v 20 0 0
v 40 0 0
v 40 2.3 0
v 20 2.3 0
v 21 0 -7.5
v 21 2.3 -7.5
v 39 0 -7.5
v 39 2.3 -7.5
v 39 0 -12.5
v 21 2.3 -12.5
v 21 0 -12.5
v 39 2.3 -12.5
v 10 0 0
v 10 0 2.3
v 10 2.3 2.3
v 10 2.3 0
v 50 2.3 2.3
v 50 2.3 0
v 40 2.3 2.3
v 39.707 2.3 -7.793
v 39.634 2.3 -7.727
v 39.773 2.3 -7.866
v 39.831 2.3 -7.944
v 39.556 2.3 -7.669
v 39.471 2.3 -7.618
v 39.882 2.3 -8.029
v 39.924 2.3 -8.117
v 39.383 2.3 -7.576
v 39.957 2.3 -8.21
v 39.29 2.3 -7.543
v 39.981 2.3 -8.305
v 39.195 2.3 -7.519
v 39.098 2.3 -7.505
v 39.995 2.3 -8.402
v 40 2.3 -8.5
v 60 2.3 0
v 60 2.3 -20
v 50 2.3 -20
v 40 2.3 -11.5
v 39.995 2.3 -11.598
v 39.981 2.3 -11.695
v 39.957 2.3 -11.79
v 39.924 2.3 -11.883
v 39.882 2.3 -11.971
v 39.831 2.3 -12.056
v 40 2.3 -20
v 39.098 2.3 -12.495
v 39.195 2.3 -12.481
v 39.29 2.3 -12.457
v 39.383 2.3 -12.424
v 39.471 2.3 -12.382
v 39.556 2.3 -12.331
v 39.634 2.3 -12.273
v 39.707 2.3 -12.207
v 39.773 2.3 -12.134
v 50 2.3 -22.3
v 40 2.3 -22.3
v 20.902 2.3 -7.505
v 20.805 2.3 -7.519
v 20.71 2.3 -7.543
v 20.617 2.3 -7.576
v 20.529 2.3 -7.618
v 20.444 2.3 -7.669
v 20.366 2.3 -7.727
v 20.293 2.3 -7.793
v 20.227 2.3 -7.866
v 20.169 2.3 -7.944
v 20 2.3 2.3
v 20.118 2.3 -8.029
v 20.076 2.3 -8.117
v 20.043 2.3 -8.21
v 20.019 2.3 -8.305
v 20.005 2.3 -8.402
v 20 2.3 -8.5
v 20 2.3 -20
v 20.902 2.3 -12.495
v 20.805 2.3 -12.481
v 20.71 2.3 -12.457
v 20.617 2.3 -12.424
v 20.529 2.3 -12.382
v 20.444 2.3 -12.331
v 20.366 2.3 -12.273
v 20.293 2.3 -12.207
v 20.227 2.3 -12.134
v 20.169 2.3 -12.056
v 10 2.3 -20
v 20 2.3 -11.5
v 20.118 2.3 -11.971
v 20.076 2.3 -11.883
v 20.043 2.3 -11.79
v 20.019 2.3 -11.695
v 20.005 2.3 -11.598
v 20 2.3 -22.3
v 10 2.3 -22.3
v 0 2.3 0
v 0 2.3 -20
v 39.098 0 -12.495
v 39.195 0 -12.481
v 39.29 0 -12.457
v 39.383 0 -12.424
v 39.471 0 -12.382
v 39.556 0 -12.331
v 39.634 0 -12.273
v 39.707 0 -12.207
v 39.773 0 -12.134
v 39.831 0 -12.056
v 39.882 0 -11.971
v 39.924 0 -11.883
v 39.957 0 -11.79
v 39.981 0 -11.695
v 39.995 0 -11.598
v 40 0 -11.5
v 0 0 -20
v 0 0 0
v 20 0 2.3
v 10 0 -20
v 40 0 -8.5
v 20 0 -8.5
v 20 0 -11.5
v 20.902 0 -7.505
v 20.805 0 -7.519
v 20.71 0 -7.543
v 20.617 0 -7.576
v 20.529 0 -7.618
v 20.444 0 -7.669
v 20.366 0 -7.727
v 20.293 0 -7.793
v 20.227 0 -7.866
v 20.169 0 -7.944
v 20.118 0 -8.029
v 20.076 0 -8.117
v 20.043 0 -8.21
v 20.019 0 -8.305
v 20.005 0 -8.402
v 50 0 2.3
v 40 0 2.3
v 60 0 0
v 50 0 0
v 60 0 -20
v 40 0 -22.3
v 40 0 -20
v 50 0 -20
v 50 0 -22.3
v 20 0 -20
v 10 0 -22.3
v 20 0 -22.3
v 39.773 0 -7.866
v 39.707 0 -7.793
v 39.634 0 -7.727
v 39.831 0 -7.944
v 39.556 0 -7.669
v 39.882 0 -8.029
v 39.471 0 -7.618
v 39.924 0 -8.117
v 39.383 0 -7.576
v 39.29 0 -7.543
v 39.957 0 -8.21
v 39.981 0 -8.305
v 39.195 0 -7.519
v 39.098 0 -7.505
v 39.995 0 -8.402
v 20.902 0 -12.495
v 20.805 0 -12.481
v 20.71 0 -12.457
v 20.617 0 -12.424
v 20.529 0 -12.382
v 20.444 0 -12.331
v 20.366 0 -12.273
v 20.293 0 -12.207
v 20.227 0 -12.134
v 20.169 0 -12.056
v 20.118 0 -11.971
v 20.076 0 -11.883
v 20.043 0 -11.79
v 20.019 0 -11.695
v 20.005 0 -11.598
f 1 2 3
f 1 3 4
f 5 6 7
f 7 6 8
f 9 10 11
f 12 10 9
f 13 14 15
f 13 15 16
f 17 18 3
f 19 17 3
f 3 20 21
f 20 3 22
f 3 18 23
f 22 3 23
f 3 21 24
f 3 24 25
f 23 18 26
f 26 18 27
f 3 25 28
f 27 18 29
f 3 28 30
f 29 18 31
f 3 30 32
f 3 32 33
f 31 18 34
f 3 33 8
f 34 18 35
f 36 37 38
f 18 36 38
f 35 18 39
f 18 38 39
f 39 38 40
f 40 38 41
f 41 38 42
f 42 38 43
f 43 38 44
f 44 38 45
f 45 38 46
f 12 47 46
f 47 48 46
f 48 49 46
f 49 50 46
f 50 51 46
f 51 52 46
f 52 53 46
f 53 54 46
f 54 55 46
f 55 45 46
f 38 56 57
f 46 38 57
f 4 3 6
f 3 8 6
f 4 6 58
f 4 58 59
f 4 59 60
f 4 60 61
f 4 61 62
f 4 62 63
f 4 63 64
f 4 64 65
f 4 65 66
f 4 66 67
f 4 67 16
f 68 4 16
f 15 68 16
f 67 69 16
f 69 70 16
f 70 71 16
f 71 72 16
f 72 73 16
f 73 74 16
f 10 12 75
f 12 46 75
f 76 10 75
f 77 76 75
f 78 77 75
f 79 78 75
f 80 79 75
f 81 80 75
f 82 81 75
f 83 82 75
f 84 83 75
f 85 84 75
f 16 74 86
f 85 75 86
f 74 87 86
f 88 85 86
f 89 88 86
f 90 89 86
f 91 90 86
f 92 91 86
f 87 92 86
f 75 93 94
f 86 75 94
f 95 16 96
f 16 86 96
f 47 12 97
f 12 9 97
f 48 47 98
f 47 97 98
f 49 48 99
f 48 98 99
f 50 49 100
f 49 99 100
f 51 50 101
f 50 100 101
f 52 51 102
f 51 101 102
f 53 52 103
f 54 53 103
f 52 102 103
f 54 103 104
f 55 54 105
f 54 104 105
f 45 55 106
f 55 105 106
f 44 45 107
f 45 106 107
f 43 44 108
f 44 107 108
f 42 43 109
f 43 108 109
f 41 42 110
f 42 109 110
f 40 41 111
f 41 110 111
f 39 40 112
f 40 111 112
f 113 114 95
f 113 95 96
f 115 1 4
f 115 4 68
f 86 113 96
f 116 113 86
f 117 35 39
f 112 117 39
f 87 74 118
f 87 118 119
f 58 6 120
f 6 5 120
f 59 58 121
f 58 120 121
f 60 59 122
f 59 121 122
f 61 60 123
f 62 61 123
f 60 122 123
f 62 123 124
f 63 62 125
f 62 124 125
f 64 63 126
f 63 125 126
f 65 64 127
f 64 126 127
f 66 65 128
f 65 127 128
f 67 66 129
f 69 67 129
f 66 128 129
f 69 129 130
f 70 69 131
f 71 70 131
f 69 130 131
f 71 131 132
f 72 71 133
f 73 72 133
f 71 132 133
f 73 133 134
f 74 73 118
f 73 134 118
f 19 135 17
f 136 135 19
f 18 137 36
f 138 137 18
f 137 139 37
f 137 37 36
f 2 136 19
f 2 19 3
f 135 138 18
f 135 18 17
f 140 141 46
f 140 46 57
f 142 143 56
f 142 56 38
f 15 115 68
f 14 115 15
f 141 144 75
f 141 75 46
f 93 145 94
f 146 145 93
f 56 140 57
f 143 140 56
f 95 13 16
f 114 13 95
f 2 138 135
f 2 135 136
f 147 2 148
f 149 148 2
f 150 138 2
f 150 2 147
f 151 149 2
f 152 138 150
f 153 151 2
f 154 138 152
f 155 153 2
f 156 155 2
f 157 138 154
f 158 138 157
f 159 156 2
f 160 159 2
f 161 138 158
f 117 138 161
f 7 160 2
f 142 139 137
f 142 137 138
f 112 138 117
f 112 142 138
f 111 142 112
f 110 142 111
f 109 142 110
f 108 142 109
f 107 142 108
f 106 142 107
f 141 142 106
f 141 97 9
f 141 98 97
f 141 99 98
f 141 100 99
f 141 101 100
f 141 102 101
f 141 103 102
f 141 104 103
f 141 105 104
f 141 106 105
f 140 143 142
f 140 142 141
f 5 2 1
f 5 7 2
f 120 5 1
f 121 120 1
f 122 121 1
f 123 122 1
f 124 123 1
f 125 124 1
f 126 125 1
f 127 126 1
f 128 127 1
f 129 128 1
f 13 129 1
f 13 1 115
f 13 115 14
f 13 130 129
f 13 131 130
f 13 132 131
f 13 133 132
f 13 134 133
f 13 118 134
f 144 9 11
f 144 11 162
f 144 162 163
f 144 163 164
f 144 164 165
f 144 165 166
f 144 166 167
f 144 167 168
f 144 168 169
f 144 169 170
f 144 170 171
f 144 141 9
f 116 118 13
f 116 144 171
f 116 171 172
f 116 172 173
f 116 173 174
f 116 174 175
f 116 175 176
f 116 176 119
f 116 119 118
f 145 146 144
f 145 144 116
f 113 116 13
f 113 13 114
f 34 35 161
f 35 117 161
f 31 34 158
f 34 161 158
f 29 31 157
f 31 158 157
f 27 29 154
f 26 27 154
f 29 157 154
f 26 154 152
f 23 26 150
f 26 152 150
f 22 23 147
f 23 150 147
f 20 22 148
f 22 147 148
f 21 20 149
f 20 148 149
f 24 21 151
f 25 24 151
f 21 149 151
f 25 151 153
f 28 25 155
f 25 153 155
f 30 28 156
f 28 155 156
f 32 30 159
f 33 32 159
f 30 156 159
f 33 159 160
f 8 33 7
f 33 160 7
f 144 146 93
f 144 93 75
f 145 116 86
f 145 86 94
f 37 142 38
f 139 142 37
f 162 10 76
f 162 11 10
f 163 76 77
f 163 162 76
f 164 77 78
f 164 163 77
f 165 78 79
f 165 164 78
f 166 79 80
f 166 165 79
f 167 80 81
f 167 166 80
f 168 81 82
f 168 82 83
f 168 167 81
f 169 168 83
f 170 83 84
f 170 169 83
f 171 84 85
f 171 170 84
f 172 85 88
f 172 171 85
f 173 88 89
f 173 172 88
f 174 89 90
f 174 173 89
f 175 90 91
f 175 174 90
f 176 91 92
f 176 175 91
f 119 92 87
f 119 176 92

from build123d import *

# Parameters (mm, degrees)
BOSS_EXTRUDE1_DEPTH = 2.3
SKETCH2_W           = 20
SKETCH2_H           = 5
CUT_EXTRUDE1_DEPTH  = 10
FILLET1_R           = 1


with BuildPart() as part:
    # Sketch1 → Boss-Extrude1 (new body)
    with BuildSketch(Plane(origin=(0, 0, 0), x_dir=(1, 0, 0), z_dir=(0, 1, 0))):
        Polygon((0, 0), (0, 20), (10, 20), (10, 22.3), (20, 22.3), (20, 20), (40, 20), (40, 22.3), (50, 22.3), (50, 20), (60, 20), (60, 0), (50, 0), (50, -2.3), (40, -2.3), (40, 0), (20, 0), (20, -2.3), (10, -2.3), (10, 0), align=None)
    extrude(amount=BOSS_EXTRUDE1_DEPTH)

    # Sketch2 → Cut-Extrude1 (cut)
    with BuildSketch(Plane(origin=(0, 2.3, 0), x_dir=(1, 0, 0), z_dir=(0, 1, 0))):
        with Locations((30, 10)):
            Rectangle(SKETCH2_W, SKETCH2_H)
    extrude(amount=-CUT_EXTRUDE1_DEPTH, mode=Mode.SUBTRACT)

    # Fillet1
    fillet1_edges = [part.edges().sort_by_distance(p)[0] for p in [
        (20, 1.15, -12.5),
        (40, 1.15, -12.5),
        (40, 1.15, -7.5),
        (20, 1.15, -7.5),
    ]]
    fillet(fillet1_edges, radius=FILLET1_R)


solid = part.part
